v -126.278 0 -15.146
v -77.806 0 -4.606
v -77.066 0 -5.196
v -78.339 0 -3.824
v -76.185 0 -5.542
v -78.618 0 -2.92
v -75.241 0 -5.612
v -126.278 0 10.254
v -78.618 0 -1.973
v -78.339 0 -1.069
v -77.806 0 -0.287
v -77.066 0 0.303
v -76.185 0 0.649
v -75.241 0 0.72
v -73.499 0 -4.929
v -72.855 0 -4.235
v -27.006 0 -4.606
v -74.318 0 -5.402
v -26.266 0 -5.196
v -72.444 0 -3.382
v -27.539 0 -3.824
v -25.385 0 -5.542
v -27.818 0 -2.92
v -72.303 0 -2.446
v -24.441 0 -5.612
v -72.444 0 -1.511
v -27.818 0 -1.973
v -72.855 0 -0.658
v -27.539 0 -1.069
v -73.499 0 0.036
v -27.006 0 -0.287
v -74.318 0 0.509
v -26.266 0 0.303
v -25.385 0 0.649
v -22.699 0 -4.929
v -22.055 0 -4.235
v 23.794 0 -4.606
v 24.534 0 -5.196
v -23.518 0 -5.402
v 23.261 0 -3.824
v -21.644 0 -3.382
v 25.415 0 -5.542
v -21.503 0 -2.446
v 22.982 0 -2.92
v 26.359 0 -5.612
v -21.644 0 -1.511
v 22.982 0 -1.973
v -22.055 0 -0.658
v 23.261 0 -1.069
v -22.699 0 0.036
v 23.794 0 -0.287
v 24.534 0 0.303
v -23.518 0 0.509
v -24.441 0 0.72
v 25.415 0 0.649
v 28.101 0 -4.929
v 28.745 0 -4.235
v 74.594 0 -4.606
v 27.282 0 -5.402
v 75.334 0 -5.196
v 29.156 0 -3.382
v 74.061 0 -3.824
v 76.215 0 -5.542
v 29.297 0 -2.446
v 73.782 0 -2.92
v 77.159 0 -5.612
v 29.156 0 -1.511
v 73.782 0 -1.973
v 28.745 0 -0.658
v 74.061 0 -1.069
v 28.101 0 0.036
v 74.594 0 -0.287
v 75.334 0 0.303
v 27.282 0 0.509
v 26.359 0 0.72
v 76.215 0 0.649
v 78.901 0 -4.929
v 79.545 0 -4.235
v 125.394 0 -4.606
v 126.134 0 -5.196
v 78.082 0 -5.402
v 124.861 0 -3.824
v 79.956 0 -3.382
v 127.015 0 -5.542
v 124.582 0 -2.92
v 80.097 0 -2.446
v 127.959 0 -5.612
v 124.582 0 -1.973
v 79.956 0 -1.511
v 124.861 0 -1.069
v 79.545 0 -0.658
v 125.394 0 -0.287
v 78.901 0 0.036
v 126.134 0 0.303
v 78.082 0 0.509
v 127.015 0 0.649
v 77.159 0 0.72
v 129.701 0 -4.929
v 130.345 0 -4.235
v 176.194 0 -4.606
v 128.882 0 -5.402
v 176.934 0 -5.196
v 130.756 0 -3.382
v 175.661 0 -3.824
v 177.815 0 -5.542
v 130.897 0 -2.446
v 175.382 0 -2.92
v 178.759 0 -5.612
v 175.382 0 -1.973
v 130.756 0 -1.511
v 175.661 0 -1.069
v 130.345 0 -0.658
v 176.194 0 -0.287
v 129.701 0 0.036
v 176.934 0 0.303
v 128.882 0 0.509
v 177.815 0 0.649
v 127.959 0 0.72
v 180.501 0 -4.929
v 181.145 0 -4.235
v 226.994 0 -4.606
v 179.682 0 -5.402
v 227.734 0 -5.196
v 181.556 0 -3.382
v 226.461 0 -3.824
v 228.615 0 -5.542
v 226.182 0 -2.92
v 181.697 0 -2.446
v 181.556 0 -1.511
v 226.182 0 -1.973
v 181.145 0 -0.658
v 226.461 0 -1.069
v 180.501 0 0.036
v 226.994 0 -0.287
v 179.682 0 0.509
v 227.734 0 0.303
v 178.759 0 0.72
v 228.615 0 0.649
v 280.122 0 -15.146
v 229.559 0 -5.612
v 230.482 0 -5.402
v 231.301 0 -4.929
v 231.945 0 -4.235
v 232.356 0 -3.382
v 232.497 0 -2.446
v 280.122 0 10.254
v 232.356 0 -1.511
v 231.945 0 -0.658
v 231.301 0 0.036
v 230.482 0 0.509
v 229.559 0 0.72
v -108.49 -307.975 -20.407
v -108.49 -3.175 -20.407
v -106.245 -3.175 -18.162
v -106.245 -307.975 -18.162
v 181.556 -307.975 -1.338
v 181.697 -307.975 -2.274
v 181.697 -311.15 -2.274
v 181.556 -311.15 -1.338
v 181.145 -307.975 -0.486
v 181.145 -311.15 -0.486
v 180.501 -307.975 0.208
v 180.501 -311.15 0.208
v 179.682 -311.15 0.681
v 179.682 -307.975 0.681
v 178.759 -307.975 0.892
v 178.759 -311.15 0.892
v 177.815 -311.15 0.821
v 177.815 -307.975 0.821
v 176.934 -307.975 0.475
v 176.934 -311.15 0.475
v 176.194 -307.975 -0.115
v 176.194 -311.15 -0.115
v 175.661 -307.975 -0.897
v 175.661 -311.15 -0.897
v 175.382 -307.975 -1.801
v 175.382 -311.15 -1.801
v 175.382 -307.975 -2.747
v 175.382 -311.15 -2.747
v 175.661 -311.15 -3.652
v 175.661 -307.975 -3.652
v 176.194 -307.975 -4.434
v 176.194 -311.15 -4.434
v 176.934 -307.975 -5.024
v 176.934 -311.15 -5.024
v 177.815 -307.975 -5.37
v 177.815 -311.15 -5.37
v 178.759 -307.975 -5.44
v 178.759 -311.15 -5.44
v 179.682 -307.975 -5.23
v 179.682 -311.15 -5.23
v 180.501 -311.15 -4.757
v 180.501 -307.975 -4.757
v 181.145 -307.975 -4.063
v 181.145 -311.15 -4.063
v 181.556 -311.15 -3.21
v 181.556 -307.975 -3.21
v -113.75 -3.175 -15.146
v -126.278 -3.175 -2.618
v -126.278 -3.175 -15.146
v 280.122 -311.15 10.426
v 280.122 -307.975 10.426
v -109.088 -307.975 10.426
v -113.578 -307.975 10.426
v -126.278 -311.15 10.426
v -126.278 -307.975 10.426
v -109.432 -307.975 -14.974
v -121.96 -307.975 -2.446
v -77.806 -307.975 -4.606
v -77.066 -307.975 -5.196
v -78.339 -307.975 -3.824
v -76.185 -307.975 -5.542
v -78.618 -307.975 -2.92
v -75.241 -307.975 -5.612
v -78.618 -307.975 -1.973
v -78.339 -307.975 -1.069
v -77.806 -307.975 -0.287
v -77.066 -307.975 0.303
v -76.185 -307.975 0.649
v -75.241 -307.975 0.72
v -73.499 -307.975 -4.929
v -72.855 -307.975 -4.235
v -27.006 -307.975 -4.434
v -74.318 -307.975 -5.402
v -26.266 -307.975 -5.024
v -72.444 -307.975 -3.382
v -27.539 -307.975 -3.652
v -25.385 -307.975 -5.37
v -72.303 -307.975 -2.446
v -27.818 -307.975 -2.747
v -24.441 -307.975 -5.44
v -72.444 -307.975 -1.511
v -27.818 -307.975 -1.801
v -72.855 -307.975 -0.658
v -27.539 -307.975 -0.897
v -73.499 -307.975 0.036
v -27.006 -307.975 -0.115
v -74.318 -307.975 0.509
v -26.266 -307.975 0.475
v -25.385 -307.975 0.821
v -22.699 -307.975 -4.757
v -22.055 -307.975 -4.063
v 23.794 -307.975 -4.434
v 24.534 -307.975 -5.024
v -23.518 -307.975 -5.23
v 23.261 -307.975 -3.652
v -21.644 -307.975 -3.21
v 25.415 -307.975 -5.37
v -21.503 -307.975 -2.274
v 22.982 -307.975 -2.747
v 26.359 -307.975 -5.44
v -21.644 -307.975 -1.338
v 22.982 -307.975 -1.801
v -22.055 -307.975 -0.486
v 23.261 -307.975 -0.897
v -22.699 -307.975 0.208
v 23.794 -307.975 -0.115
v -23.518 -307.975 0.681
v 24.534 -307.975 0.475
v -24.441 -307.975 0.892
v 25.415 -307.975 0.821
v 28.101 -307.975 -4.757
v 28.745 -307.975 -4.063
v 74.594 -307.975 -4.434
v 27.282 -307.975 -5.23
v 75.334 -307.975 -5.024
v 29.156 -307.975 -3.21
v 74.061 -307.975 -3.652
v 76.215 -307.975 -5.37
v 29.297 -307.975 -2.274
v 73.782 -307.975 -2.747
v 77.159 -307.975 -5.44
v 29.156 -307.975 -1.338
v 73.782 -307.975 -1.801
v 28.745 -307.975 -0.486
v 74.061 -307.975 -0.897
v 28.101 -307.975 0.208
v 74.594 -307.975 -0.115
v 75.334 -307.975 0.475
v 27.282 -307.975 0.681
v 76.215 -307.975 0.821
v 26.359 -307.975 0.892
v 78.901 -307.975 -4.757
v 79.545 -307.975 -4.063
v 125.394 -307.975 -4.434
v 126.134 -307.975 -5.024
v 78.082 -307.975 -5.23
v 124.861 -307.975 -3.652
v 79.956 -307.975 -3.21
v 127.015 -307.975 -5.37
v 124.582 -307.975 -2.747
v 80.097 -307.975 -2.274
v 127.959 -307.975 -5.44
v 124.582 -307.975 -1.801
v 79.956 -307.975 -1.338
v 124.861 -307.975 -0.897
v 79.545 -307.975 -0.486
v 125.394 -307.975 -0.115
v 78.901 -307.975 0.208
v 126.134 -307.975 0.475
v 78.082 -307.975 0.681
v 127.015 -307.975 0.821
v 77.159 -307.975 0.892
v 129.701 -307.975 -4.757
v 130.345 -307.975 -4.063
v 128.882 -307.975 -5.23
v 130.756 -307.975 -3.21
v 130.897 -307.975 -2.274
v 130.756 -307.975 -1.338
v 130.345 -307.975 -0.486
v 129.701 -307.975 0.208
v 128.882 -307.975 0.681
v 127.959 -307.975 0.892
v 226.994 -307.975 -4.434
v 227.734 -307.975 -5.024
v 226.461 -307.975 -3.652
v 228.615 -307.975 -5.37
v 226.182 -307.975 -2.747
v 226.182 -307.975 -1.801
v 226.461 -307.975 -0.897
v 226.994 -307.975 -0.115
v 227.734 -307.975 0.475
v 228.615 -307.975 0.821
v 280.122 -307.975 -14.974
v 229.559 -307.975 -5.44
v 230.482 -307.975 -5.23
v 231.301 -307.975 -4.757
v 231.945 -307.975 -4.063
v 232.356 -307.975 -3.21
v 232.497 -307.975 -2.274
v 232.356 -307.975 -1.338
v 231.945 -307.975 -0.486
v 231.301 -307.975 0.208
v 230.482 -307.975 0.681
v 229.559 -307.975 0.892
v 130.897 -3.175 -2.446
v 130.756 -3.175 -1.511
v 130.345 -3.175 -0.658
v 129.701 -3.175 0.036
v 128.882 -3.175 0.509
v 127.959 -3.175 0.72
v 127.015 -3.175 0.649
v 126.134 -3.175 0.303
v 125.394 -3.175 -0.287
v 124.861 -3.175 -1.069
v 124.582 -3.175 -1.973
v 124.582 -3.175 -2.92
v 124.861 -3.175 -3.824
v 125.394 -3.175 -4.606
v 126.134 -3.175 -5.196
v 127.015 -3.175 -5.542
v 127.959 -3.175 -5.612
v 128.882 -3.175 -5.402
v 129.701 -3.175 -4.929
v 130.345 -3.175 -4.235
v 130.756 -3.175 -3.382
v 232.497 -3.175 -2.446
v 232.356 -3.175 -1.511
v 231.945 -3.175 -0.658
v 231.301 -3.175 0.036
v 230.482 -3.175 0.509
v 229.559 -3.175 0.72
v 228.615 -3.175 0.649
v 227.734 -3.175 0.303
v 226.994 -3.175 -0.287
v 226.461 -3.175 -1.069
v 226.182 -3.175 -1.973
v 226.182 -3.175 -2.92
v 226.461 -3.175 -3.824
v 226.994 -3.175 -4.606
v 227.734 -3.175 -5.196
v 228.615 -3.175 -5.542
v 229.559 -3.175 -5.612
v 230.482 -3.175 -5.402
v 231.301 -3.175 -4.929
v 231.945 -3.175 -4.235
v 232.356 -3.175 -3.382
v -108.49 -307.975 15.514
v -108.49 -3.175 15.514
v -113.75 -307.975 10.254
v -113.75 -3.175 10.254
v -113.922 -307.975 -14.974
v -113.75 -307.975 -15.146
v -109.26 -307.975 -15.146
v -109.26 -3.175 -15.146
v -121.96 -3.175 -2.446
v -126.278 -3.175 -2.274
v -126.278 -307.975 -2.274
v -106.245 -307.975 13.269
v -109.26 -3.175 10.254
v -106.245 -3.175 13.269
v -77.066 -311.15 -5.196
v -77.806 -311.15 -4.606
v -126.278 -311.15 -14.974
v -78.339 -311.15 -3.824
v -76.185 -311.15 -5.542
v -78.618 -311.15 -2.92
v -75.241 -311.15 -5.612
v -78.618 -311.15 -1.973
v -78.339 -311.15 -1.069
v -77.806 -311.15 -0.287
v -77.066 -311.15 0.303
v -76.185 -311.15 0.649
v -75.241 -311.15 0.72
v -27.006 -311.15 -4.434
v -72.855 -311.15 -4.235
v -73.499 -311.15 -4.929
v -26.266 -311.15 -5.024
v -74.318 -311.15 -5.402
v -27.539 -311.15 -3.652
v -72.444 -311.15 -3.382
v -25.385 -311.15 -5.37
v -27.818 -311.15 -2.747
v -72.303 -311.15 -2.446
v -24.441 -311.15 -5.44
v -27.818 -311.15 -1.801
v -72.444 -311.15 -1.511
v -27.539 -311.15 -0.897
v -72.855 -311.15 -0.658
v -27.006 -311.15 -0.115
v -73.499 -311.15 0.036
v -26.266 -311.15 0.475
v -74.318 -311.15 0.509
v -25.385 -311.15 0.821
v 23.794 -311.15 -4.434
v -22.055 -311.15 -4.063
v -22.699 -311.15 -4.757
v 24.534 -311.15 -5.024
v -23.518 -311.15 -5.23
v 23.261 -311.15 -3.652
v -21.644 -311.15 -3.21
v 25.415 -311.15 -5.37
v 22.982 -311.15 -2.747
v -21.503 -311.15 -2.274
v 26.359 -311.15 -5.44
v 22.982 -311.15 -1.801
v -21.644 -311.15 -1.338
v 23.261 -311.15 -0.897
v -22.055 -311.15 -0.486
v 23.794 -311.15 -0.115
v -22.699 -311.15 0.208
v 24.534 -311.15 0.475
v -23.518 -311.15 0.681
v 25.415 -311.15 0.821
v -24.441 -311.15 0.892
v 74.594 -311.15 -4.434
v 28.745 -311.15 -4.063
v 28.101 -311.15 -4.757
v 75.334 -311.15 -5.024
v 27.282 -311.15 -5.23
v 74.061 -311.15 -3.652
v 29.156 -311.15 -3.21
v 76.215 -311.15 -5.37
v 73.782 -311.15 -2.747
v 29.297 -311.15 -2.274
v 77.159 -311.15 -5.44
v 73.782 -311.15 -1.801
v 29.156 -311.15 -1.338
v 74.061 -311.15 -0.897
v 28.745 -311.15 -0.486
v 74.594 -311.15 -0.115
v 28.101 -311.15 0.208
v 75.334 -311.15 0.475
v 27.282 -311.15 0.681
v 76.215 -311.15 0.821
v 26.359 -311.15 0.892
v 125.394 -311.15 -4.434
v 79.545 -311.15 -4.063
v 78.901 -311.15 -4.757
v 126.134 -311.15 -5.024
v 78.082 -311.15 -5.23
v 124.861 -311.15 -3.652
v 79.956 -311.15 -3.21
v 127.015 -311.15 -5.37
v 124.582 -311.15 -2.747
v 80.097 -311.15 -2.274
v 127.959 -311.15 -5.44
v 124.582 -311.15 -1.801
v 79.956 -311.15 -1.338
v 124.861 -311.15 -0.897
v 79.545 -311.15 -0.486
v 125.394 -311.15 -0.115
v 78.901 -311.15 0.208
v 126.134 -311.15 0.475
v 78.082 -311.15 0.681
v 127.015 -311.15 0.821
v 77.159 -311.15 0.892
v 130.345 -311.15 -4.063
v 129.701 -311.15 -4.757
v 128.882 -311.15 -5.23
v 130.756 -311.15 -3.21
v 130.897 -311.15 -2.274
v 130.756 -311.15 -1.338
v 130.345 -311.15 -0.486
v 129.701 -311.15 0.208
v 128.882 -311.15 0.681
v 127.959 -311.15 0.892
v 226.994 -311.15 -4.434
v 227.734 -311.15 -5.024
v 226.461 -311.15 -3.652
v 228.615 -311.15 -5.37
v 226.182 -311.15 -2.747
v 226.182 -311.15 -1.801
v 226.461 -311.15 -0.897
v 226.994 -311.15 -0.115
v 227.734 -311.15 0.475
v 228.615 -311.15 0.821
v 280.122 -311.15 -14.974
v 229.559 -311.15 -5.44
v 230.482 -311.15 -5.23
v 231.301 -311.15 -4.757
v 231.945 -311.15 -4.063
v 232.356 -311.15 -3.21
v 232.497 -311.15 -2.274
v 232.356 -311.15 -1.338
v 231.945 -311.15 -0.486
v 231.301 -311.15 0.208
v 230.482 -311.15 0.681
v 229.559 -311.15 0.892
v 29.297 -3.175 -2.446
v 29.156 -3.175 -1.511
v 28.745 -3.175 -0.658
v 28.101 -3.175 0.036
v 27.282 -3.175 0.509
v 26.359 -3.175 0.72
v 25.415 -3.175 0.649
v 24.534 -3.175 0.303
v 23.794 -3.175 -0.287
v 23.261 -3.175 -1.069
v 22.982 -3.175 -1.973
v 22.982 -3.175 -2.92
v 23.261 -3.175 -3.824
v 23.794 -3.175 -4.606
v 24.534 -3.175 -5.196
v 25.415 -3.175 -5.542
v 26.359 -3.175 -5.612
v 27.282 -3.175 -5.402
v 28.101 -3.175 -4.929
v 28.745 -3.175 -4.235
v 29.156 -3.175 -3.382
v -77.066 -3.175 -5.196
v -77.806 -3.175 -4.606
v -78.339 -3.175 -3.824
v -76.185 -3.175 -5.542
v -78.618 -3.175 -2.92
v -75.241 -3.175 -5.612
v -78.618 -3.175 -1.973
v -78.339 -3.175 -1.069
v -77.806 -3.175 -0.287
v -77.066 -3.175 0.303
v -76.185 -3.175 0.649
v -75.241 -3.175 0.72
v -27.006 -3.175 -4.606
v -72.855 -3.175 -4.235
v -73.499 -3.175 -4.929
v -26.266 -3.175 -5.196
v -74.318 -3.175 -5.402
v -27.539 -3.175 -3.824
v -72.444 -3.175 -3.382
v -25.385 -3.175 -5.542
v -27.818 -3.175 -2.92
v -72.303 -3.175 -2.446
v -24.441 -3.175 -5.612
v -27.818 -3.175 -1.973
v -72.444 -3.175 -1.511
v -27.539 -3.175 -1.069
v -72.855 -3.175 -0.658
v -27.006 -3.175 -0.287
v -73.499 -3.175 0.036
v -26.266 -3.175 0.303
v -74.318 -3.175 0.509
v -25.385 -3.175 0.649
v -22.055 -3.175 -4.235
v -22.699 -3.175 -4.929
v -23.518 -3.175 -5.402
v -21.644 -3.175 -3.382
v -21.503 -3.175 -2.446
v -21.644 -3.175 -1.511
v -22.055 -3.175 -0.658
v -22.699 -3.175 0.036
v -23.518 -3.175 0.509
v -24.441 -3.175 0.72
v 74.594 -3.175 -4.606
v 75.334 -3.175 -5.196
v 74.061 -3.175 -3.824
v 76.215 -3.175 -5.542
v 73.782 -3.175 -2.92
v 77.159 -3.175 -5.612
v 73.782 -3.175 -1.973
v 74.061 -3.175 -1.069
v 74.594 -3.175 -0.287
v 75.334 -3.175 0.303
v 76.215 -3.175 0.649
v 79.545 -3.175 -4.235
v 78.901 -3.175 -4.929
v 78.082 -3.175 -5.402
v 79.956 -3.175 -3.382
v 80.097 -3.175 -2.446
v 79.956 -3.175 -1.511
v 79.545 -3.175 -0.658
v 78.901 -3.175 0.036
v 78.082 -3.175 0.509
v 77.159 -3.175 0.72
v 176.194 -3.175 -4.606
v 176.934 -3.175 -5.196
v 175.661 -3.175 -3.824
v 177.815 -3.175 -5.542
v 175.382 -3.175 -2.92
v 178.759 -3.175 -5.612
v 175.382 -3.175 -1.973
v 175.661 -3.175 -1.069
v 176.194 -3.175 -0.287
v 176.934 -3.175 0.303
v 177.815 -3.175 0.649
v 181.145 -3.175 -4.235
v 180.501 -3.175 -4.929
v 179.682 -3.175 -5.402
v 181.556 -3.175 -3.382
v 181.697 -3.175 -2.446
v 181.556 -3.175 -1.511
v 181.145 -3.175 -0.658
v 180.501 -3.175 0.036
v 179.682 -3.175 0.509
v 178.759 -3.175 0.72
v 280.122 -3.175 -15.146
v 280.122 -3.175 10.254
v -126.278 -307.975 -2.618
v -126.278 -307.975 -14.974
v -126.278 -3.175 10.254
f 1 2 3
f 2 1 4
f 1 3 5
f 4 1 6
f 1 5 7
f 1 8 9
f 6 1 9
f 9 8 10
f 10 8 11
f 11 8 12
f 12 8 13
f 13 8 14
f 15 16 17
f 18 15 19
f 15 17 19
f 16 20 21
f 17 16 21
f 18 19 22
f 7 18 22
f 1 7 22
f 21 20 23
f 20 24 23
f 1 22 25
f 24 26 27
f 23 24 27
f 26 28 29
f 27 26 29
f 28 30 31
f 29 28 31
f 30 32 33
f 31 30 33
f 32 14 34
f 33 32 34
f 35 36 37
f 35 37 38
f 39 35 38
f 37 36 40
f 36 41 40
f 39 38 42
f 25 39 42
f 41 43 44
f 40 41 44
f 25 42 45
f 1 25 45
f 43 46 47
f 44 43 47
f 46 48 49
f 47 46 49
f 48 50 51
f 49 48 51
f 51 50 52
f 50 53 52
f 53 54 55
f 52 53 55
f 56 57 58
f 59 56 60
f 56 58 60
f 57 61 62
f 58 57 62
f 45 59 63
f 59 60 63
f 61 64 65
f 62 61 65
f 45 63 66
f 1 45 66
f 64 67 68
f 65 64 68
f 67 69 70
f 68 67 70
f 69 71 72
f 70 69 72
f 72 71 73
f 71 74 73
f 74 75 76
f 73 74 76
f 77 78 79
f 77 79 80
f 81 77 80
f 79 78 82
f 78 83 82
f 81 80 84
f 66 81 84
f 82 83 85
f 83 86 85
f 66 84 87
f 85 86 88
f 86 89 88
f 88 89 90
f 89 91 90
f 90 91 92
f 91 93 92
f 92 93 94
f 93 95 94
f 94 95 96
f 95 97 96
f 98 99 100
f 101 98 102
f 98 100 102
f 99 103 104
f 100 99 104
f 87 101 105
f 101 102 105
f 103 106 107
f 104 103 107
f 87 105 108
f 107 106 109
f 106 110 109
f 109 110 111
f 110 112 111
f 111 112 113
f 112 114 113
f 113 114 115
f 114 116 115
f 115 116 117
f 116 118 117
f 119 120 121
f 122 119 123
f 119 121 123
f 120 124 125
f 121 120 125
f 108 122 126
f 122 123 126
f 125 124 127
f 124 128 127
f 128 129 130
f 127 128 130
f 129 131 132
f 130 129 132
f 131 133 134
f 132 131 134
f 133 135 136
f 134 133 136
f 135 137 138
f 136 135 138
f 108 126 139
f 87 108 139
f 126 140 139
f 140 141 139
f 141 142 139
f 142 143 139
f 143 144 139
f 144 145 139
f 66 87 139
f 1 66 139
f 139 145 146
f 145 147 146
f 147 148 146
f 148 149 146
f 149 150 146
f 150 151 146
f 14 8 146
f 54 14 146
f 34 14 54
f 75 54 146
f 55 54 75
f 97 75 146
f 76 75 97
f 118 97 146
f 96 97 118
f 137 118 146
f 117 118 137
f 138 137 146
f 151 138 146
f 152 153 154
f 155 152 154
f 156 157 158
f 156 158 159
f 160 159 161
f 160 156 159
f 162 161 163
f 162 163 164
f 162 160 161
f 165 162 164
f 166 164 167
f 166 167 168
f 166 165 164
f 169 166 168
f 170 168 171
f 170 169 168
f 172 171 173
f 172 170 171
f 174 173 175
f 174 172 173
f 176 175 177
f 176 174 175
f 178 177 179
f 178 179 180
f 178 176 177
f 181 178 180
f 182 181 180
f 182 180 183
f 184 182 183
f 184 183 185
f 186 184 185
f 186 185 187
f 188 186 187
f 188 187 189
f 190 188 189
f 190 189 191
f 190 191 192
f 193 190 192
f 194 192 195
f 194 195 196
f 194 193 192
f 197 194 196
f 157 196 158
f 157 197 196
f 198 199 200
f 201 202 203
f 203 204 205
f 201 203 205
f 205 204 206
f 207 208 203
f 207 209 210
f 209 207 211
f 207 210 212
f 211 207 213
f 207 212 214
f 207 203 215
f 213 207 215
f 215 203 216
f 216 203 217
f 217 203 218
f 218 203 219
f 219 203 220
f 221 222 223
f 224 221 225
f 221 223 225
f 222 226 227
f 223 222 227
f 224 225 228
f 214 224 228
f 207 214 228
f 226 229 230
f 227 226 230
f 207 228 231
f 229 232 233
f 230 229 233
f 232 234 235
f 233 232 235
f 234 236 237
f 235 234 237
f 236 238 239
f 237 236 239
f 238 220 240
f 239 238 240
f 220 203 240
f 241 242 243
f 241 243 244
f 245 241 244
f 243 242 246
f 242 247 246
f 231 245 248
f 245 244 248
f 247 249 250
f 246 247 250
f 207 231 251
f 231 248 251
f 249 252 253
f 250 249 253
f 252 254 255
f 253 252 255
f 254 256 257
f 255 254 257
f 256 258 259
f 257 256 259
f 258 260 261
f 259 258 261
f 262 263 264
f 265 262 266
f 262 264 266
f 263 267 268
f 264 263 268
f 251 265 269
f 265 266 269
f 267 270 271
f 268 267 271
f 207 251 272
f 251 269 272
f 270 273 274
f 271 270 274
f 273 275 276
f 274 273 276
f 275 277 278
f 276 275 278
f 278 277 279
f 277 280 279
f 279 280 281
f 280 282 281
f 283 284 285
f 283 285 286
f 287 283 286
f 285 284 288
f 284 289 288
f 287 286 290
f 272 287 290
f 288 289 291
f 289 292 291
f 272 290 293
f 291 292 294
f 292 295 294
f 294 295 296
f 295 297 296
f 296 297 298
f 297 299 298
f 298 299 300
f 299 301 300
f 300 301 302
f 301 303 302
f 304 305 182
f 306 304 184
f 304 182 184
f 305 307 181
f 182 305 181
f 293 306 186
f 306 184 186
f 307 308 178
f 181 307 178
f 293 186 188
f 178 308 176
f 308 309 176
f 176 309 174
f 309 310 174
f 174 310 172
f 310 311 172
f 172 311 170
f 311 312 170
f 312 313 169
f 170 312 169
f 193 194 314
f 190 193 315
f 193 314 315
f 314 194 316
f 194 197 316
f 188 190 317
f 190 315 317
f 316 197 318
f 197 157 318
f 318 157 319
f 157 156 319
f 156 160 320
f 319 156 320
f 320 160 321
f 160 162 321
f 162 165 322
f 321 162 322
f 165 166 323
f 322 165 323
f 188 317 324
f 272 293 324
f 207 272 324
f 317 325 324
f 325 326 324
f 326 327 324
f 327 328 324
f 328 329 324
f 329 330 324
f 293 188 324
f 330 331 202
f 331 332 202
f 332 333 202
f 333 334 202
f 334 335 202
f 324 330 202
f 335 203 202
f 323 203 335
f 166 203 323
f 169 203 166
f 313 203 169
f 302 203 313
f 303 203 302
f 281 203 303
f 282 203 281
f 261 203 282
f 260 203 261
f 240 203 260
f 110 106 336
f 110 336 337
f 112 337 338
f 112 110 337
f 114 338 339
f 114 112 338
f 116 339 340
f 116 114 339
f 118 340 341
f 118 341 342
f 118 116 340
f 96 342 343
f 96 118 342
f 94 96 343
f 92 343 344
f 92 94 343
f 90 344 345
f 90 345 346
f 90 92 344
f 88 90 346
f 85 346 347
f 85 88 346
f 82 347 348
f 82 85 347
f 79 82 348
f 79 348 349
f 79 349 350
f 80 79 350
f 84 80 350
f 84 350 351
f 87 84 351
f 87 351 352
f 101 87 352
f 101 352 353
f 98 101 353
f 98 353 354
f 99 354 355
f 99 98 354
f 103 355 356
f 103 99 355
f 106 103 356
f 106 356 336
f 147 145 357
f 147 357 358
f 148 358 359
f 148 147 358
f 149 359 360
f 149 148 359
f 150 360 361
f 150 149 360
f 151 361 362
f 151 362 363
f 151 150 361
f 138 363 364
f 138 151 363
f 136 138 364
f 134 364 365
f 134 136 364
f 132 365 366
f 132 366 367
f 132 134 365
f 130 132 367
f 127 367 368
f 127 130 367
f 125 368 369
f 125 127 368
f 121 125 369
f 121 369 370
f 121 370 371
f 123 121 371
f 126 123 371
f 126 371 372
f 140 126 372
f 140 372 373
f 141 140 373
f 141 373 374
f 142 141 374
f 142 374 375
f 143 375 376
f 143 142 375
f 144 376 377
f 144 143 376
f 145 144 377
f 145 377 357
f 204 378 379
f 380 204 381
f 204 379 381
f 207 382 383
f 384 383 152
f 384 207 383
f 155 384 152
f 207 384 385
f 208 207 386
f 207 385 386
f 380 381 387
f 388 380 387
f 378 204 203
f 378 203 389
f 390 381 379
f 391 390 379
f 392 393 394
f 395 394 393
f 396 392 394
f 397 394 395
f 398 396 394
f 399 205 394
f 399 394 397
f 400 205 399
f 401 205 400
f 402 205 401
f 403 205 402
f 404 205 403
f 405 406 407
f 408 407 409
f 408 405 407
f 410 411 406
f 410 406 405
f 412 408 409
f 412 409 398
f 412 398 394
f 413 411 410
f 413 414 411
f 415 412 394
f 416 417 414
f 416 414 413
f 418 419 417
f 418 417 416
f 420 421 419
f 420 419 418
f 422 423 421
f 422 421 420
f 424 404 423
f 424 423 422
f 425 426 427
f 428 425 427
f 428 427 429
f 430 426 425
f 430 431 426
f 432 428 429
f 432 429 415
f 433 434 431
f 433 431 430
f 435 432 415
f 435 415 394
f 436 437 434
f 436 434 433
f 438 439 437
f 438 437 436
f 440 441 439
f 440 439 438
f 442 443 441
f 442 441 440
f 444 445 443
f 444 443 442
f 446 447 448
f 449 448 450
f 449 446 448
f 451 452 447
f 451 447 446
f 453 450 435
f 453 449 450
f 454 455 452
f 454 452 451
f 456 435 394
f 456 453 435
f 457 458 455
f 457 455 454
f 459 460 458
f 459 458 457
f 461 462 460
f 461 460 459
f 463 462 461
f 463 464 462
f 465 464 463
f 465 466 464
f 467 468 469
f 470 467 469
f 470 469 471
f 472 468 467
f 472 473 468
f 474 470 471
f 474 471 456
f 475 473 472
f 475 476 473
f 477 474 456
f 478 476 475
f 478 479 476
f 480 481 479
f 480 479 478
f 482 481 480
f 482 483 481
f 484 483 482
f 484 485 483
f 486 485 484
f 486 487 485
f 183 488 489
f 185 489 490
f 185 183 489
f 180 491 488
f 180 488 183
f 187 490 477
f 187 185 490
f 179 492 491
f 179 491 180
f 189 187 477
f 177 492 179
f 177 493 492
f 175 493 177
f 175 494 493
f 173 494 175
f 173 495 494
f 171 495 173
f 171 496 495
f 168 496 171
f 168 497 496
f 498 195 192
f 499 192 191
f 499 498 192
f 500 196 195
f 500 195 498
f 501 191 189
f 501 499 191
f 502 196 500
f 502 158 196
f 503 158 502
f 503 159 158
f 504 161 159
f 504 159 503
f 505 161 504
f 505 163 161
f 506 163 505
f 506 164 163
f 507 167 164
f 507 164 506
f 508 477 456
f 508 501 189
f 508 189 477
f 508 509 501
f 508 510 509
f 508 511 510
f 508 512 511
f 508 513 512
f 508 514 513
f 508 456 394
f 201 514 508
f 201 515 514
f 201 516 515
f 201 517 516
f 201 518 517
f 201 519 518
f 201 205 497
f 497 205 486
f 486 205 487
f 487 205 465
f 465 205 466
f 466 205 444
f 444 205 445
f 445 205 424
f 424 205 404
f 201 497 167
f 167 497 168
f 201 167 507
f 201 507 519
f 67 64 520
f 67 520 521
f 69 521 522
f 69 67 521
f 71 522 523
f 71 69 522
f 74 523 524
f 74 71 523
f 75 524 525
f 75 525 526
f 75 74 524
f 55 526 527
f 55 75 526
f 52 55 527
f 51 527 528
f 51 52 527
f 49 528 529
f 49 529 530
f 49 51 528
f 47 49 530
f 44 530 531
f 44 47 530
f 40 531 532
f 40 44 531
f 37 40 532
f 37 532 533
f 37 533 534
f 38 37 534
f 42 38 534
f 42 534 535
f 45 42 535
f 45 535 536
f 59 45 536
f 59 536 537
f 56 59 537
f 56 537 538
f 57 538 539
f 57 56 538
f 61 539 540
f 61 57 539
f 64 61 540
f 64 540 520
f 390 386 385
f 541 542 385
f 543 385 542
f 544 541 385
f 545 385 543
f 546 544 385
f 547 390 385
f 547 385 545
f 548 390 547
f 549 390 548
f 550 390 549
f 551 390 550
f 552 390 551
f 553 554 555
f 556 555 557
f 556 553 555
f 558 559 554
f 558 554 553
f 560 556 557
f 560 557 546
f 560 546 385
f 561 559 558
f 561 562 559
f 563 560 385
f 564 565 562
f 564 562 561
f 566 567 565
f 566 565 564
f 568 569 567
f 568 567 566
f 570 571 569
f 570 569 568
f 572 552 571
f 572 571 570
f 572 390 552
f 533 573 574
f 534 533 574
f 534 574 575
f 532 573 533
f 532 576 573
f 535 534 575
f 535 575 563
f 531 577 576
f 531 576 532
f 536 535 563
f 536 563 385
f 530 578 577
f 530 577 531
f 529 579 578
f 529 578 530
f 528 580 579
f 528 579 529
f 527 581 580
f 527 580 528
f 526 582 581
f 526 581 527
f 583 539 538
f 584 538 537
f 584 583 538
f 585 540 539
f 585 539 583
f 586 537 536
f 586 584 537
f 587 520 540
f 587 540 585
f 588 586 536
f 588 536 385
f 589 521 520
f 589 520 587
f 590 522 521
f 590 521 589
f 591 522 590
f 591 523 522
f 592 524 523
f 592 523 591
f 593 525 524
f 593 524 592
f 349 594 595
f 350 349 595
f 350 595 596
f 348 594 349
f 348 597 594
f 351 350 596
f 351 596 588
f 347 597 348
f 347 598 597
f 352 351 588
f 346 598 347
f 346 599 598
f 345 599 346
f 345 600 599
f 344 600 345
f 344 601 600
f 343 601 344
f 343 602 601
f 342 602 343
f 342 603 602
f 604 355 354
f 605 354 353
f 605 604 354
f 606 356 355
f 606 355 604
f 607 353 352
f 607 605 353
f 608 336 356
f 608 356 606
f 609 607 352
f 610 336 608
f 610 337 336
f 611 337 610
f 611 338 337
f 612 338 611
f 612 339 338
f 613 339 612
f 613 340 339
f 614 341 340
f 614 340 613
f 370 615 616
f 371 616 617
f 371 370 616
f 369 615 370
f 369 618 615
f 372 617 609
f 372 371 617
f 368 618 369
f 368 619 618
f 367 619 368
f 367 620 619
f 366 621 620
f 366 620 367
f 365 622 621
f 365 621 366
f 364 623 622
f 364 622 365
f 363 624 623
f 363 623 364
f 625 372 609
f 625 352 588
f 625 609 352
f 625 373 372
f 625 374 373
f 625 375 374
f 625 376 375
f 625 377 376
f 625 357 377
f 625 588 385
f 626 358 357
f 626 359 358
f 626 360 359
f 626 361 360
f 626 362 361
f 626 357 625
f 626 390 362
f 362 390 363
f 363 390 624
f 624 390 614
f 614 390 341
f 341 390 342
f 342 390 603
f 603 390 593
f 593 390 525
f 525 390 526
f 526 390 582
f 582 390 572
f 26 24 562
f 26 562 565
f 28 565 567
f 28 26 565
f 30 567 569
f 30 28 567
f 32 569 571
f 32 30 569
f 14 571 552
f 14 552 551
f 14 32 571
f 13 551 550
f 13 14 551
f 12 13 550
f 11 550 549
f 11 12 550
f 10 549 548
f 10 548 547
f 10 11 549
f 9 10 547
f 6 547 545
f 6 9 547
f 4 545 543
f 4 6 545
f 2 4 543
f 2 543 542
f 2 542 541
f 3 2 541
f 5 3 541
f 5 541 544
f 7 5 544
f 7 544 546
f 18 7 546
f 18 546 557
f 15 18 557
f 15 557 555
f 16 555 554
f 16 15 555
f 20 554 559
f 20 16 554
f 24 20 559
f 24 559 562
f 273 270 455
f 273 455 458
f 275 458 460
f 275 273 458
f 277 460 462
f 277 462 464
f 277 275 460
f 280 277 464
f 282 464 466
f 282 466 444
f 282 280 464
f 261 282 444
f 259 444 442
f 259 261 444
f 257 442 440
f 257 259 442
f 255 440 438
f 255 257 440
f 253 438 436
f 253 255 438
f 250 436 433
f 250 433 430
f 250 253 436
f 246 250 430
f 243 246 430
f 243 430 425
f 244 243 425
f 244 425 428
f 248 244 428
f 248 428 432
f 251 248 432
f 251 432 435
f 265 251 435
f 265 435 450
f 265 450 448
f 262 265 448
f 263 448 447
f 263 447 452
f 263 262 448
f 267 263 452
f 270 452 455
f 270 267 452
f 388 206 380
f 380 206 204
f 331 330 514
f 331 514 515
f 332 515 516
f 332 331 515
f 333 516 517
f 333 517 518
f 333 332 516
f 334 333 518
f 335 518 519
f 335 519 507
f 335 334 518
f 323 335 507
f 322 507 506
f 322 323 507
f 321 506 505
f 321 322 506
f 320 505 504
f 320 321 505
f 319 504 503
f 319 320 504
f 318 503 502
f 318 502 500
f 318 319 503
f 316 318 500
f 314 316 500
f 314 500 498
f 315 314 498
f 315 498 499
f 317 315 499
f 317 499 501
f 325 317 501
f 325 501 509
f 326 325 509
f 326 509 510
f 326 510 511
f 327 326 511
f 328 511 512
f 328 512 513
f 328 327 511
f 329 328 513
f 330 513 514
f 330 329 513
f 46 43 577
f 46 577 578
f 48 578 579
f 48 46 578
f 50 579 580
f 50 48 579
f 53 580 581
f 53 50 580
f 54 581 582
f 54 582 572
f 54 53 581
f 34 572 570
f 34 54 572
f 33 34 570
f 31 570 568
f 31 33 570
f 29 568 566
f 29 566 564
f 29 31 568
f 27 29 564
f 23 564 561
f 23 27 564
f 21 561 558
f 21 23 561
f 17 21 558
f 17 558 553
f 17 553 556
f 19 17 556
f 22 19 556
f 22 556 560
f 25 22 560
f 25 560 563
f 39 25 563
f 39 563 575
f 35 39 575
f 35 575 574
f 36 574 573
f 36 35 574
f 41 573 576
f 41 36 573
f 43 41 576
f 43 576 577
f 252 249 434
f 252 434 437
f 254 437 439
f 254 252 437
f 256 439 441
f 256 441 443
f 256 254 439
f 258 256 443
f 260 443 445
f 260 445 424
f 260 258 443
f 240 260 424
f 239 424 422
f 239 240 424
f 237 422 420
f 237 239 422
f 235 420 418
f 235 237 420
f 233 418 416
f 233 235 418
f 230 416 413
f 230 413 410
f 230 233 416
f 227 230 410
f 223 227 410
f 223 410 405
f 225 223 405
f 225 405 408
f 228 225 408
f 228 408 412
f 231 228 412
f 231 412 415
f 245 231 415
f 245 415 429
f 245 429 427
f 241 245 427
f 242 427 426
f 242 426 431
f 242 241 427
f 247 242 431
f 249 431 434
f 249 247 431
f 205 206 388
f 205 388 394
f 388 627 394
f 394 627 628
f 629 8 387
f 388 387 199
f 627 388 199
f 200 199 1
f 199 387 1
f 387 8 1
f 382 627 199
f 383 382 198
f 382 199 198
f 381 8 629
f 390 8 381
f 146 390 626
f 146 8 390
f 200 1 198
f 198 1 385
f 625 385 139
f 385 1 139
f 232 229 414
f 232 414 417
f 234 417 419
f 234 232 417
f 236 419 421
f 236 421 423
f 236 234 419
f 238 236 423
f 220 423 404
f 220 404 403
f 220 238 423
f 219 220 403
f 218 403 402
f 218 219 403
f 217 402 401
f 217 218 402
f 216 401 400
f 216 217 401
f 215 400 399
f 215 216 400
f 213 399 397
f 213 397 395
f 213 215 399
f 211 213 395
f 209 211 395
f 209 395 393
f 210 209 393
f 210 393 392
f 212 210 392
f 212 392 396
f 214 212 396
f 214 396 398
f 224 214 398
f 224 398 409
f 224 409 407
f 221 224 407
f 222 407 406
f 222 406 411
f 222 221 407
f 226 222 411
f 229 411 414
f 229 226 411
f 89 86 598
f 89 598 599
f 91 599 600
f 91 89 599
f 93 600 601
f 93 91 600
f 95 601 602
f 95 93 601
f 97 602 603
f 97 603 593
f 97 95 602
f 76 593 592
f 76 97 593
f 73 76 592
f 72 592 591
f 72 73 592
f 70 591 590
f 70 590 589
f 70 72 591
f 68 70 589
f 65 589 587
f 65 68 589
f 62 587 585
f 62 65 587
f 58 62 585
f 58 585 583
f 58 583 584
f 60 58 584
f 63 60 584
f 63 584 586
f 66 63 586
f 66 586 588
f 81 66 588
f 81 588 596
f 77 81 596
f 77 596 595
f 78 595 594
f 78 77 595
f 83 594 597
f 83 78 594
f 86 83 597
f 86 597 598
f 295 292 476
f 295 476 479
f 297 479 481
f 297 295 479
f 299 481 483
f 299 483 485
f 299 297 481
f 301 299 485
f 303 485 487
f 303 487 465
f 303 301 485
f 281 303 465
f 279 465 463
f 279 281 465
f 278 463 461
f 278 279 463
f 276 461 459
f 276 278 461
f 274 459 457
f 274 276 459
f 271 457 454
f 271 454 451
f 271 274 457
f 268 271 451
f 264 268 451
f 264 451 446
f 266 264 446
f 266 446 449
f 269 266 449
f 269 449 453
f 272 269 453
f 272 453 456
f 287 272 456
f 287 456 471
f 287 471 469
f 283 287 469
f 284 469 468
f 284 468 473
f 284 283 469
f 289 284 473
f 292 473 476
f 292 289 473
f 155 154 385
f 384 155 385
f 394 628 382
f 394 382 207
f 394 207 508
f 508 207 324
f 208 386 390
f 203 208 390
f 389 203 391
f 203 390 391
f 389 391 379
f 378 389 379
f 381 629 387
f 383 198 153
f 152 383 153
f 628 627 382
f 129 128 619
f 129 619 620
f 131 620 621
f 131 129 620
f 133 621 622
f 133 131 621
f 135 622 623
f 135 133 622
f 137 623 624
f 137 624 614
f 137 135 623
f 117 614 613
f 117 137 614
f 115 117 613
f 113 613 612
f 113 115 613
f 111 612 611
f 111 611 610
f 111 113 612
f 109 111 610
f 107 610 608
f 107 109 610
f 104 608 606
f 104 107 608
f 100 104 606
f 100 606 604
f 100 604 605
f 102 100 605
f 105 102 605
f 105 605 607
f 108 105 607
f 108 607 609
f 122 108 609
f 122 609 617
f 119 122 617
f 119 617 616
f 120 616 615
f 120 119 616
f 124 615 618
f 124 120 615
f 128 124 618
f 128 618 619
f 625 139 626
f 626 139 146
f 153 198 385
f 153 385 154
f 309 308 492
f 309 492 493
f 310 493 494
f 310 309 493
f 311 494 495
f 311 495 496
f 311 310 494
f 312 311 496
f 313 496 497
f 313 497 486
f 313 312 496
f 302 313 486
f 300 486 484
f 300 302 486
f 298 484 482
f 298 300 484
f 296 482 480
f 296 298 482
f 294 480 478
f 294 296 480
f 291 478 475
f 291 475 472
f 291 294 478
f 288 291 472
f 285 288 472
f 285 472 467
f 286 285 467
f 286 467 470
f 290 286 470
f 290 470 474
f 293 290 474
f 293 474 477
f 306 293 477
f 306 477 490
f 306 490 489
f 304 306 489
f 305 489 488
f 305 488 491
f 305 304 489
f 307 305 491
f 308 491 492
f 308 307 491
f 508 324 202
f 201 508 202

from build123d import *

# Parameters (mm, degrees)
F0_W     = 406.4
F0_H     = 25.4
F0_R     = 3.175
F1_DEPTH = 3.175
F3_DEPTH = 304.8
F4_R     = 3.175
F5_DEPTH = 3.175


# Not quite as in the source:
# - a length typed as a fraction of an inch, garbled in the dataset ("3 / 203.2 mm" for 3/8 in), is restored


with BuildPart() as f1:
    # F0 (on Front) → F1 (new body)
    with BuildSketch(Plane.XZ):
        with Locations((76.9218784556, -2.4463492446)):
            Rectangle(F0_W, F0_H)
        with Locations((-75.4781215444, -2.4463492446)):
            Circle(F0_R, mode=Mode.SUBTRACT)
        with Locations((-24.6781215444, -2.4463492446)):
            Circle(F0_R, mode=Mode.SUBTRACT)
        with Locations((26.1218784556, -2.4463492446)):
            Circle(F0_R, mode=Mode.SUBTRACT)
        with Locations((76.9218784556, -2.4463492446)):
            Circle(F0_R, mode=Mode.SUBTRACT)
        with Locations((127.7218784556, -2.4463492446)):
            Circle(F0_R, mode=Mode.SUBTRACT)
        with Locations((178.5218784556, -2.4463492446)):
            Circle(F0_R, mode=Mode.SUBTRACT)
        with Locations((229.3218784556, -2.4463492446)):
            Circle(F0_R, mode=Mode.SUBTRACT)
    extrude(amount=F1_DEPTH)

    # F2 (on face) → F3 (join)
    with BuildSketch(Plane.XZ.offset(3.175)):
        Polygon((-108.4897565831, 15.5141629976), (-113.7502688252, 10.2536507554), (-109.2601407647, 10.2536507554), (-106.2446925528, 13.2690989673), align=None)
        Polygon((-113.7502688252, 10.2536507554), (-126.2781215444, -2.2742019637), (-126.2781215444, -2.4463492446), (-126.2781215444, -2.6184965255), (-113.7502688252, -15.1463492446), (-109.2601407647, -15.1463492446), (-121.9601407647, -2.4463492446), (-109.2601407647, 10.2536507554), align=None)
        Polygon((-109.2601407647, -15.1463492446), (-113.7502688252, -15.1463492446), (-108.4897565831, -20.4068614867), (-106.2446925528, -18.1617974564), align=None)
    extrude(amount=F3_DEPTH)

    # F4 (on face) → F5 (join)
    with BuildSketch(Plane.XZ.offset(307.975)):
        Polygon((280.1218784556, 10.4257980363), (-109.0879934838, 10.4257980363), (-121.9601407647, -2.4463492446), (-109.4322880456, -14.9742019637), (280.1218784556, -14.9742019637), align=None)
        with Locations((-75.4781215444, -2.4463492446)):
            Circle(F4_R, mode=Mode.SUBTRACT)
        with Locations((-24.6781215444, -2.2742019637)):
            Circle(F4_R, mode=Mode.SUBTRACT)
        with Locations((26.1218784556, -2.2742019637)):
            Circle(F4_R, mode=Mode.SUBTRACT)
        with Locations((76.9218784556, -2.2742019637)):
            Circle(F4_R, mode=Mode.SUBTRACT)
        with Locations((127.7218784556, -2.2742019637)):
            Circle(F4_R, mode=Mode.SUBTRACT)
        with Locations((178.5218784556, -2.2742019637)):
            Circle(F4_R, mode=Mode.SUBTRACT)
        with Locations((229.3218784556, -2.2742019637)):
            Circle(F4_R, mode=Mode.SUBTRACT)
        Polygon((-126.2781215444, 10.4257980363), (-126.2781215444, -2.2742019637), (-113.5781215444, 10.4257980363), align=None)
        Polygon((-113.9224161061, -14.9742019637), (-126.2781215444, -2.6184965255), (-126.2781215444, -14.9742019637), align=None)
        Polygon((-113.5781215444, 10.4257980363), (-126.2781215444, -2.2742019637), (-126.2781215444, -2.6184965255), (-113.9224161061, -14.9742019637), (-109.4322880456, -14.9742019637), (-121.9601407647, -2.4463492446), (-109.0879934838, 10.4257980363), align=None)
    extrude(amount=F5_DEPTH)


solid = f1.part
